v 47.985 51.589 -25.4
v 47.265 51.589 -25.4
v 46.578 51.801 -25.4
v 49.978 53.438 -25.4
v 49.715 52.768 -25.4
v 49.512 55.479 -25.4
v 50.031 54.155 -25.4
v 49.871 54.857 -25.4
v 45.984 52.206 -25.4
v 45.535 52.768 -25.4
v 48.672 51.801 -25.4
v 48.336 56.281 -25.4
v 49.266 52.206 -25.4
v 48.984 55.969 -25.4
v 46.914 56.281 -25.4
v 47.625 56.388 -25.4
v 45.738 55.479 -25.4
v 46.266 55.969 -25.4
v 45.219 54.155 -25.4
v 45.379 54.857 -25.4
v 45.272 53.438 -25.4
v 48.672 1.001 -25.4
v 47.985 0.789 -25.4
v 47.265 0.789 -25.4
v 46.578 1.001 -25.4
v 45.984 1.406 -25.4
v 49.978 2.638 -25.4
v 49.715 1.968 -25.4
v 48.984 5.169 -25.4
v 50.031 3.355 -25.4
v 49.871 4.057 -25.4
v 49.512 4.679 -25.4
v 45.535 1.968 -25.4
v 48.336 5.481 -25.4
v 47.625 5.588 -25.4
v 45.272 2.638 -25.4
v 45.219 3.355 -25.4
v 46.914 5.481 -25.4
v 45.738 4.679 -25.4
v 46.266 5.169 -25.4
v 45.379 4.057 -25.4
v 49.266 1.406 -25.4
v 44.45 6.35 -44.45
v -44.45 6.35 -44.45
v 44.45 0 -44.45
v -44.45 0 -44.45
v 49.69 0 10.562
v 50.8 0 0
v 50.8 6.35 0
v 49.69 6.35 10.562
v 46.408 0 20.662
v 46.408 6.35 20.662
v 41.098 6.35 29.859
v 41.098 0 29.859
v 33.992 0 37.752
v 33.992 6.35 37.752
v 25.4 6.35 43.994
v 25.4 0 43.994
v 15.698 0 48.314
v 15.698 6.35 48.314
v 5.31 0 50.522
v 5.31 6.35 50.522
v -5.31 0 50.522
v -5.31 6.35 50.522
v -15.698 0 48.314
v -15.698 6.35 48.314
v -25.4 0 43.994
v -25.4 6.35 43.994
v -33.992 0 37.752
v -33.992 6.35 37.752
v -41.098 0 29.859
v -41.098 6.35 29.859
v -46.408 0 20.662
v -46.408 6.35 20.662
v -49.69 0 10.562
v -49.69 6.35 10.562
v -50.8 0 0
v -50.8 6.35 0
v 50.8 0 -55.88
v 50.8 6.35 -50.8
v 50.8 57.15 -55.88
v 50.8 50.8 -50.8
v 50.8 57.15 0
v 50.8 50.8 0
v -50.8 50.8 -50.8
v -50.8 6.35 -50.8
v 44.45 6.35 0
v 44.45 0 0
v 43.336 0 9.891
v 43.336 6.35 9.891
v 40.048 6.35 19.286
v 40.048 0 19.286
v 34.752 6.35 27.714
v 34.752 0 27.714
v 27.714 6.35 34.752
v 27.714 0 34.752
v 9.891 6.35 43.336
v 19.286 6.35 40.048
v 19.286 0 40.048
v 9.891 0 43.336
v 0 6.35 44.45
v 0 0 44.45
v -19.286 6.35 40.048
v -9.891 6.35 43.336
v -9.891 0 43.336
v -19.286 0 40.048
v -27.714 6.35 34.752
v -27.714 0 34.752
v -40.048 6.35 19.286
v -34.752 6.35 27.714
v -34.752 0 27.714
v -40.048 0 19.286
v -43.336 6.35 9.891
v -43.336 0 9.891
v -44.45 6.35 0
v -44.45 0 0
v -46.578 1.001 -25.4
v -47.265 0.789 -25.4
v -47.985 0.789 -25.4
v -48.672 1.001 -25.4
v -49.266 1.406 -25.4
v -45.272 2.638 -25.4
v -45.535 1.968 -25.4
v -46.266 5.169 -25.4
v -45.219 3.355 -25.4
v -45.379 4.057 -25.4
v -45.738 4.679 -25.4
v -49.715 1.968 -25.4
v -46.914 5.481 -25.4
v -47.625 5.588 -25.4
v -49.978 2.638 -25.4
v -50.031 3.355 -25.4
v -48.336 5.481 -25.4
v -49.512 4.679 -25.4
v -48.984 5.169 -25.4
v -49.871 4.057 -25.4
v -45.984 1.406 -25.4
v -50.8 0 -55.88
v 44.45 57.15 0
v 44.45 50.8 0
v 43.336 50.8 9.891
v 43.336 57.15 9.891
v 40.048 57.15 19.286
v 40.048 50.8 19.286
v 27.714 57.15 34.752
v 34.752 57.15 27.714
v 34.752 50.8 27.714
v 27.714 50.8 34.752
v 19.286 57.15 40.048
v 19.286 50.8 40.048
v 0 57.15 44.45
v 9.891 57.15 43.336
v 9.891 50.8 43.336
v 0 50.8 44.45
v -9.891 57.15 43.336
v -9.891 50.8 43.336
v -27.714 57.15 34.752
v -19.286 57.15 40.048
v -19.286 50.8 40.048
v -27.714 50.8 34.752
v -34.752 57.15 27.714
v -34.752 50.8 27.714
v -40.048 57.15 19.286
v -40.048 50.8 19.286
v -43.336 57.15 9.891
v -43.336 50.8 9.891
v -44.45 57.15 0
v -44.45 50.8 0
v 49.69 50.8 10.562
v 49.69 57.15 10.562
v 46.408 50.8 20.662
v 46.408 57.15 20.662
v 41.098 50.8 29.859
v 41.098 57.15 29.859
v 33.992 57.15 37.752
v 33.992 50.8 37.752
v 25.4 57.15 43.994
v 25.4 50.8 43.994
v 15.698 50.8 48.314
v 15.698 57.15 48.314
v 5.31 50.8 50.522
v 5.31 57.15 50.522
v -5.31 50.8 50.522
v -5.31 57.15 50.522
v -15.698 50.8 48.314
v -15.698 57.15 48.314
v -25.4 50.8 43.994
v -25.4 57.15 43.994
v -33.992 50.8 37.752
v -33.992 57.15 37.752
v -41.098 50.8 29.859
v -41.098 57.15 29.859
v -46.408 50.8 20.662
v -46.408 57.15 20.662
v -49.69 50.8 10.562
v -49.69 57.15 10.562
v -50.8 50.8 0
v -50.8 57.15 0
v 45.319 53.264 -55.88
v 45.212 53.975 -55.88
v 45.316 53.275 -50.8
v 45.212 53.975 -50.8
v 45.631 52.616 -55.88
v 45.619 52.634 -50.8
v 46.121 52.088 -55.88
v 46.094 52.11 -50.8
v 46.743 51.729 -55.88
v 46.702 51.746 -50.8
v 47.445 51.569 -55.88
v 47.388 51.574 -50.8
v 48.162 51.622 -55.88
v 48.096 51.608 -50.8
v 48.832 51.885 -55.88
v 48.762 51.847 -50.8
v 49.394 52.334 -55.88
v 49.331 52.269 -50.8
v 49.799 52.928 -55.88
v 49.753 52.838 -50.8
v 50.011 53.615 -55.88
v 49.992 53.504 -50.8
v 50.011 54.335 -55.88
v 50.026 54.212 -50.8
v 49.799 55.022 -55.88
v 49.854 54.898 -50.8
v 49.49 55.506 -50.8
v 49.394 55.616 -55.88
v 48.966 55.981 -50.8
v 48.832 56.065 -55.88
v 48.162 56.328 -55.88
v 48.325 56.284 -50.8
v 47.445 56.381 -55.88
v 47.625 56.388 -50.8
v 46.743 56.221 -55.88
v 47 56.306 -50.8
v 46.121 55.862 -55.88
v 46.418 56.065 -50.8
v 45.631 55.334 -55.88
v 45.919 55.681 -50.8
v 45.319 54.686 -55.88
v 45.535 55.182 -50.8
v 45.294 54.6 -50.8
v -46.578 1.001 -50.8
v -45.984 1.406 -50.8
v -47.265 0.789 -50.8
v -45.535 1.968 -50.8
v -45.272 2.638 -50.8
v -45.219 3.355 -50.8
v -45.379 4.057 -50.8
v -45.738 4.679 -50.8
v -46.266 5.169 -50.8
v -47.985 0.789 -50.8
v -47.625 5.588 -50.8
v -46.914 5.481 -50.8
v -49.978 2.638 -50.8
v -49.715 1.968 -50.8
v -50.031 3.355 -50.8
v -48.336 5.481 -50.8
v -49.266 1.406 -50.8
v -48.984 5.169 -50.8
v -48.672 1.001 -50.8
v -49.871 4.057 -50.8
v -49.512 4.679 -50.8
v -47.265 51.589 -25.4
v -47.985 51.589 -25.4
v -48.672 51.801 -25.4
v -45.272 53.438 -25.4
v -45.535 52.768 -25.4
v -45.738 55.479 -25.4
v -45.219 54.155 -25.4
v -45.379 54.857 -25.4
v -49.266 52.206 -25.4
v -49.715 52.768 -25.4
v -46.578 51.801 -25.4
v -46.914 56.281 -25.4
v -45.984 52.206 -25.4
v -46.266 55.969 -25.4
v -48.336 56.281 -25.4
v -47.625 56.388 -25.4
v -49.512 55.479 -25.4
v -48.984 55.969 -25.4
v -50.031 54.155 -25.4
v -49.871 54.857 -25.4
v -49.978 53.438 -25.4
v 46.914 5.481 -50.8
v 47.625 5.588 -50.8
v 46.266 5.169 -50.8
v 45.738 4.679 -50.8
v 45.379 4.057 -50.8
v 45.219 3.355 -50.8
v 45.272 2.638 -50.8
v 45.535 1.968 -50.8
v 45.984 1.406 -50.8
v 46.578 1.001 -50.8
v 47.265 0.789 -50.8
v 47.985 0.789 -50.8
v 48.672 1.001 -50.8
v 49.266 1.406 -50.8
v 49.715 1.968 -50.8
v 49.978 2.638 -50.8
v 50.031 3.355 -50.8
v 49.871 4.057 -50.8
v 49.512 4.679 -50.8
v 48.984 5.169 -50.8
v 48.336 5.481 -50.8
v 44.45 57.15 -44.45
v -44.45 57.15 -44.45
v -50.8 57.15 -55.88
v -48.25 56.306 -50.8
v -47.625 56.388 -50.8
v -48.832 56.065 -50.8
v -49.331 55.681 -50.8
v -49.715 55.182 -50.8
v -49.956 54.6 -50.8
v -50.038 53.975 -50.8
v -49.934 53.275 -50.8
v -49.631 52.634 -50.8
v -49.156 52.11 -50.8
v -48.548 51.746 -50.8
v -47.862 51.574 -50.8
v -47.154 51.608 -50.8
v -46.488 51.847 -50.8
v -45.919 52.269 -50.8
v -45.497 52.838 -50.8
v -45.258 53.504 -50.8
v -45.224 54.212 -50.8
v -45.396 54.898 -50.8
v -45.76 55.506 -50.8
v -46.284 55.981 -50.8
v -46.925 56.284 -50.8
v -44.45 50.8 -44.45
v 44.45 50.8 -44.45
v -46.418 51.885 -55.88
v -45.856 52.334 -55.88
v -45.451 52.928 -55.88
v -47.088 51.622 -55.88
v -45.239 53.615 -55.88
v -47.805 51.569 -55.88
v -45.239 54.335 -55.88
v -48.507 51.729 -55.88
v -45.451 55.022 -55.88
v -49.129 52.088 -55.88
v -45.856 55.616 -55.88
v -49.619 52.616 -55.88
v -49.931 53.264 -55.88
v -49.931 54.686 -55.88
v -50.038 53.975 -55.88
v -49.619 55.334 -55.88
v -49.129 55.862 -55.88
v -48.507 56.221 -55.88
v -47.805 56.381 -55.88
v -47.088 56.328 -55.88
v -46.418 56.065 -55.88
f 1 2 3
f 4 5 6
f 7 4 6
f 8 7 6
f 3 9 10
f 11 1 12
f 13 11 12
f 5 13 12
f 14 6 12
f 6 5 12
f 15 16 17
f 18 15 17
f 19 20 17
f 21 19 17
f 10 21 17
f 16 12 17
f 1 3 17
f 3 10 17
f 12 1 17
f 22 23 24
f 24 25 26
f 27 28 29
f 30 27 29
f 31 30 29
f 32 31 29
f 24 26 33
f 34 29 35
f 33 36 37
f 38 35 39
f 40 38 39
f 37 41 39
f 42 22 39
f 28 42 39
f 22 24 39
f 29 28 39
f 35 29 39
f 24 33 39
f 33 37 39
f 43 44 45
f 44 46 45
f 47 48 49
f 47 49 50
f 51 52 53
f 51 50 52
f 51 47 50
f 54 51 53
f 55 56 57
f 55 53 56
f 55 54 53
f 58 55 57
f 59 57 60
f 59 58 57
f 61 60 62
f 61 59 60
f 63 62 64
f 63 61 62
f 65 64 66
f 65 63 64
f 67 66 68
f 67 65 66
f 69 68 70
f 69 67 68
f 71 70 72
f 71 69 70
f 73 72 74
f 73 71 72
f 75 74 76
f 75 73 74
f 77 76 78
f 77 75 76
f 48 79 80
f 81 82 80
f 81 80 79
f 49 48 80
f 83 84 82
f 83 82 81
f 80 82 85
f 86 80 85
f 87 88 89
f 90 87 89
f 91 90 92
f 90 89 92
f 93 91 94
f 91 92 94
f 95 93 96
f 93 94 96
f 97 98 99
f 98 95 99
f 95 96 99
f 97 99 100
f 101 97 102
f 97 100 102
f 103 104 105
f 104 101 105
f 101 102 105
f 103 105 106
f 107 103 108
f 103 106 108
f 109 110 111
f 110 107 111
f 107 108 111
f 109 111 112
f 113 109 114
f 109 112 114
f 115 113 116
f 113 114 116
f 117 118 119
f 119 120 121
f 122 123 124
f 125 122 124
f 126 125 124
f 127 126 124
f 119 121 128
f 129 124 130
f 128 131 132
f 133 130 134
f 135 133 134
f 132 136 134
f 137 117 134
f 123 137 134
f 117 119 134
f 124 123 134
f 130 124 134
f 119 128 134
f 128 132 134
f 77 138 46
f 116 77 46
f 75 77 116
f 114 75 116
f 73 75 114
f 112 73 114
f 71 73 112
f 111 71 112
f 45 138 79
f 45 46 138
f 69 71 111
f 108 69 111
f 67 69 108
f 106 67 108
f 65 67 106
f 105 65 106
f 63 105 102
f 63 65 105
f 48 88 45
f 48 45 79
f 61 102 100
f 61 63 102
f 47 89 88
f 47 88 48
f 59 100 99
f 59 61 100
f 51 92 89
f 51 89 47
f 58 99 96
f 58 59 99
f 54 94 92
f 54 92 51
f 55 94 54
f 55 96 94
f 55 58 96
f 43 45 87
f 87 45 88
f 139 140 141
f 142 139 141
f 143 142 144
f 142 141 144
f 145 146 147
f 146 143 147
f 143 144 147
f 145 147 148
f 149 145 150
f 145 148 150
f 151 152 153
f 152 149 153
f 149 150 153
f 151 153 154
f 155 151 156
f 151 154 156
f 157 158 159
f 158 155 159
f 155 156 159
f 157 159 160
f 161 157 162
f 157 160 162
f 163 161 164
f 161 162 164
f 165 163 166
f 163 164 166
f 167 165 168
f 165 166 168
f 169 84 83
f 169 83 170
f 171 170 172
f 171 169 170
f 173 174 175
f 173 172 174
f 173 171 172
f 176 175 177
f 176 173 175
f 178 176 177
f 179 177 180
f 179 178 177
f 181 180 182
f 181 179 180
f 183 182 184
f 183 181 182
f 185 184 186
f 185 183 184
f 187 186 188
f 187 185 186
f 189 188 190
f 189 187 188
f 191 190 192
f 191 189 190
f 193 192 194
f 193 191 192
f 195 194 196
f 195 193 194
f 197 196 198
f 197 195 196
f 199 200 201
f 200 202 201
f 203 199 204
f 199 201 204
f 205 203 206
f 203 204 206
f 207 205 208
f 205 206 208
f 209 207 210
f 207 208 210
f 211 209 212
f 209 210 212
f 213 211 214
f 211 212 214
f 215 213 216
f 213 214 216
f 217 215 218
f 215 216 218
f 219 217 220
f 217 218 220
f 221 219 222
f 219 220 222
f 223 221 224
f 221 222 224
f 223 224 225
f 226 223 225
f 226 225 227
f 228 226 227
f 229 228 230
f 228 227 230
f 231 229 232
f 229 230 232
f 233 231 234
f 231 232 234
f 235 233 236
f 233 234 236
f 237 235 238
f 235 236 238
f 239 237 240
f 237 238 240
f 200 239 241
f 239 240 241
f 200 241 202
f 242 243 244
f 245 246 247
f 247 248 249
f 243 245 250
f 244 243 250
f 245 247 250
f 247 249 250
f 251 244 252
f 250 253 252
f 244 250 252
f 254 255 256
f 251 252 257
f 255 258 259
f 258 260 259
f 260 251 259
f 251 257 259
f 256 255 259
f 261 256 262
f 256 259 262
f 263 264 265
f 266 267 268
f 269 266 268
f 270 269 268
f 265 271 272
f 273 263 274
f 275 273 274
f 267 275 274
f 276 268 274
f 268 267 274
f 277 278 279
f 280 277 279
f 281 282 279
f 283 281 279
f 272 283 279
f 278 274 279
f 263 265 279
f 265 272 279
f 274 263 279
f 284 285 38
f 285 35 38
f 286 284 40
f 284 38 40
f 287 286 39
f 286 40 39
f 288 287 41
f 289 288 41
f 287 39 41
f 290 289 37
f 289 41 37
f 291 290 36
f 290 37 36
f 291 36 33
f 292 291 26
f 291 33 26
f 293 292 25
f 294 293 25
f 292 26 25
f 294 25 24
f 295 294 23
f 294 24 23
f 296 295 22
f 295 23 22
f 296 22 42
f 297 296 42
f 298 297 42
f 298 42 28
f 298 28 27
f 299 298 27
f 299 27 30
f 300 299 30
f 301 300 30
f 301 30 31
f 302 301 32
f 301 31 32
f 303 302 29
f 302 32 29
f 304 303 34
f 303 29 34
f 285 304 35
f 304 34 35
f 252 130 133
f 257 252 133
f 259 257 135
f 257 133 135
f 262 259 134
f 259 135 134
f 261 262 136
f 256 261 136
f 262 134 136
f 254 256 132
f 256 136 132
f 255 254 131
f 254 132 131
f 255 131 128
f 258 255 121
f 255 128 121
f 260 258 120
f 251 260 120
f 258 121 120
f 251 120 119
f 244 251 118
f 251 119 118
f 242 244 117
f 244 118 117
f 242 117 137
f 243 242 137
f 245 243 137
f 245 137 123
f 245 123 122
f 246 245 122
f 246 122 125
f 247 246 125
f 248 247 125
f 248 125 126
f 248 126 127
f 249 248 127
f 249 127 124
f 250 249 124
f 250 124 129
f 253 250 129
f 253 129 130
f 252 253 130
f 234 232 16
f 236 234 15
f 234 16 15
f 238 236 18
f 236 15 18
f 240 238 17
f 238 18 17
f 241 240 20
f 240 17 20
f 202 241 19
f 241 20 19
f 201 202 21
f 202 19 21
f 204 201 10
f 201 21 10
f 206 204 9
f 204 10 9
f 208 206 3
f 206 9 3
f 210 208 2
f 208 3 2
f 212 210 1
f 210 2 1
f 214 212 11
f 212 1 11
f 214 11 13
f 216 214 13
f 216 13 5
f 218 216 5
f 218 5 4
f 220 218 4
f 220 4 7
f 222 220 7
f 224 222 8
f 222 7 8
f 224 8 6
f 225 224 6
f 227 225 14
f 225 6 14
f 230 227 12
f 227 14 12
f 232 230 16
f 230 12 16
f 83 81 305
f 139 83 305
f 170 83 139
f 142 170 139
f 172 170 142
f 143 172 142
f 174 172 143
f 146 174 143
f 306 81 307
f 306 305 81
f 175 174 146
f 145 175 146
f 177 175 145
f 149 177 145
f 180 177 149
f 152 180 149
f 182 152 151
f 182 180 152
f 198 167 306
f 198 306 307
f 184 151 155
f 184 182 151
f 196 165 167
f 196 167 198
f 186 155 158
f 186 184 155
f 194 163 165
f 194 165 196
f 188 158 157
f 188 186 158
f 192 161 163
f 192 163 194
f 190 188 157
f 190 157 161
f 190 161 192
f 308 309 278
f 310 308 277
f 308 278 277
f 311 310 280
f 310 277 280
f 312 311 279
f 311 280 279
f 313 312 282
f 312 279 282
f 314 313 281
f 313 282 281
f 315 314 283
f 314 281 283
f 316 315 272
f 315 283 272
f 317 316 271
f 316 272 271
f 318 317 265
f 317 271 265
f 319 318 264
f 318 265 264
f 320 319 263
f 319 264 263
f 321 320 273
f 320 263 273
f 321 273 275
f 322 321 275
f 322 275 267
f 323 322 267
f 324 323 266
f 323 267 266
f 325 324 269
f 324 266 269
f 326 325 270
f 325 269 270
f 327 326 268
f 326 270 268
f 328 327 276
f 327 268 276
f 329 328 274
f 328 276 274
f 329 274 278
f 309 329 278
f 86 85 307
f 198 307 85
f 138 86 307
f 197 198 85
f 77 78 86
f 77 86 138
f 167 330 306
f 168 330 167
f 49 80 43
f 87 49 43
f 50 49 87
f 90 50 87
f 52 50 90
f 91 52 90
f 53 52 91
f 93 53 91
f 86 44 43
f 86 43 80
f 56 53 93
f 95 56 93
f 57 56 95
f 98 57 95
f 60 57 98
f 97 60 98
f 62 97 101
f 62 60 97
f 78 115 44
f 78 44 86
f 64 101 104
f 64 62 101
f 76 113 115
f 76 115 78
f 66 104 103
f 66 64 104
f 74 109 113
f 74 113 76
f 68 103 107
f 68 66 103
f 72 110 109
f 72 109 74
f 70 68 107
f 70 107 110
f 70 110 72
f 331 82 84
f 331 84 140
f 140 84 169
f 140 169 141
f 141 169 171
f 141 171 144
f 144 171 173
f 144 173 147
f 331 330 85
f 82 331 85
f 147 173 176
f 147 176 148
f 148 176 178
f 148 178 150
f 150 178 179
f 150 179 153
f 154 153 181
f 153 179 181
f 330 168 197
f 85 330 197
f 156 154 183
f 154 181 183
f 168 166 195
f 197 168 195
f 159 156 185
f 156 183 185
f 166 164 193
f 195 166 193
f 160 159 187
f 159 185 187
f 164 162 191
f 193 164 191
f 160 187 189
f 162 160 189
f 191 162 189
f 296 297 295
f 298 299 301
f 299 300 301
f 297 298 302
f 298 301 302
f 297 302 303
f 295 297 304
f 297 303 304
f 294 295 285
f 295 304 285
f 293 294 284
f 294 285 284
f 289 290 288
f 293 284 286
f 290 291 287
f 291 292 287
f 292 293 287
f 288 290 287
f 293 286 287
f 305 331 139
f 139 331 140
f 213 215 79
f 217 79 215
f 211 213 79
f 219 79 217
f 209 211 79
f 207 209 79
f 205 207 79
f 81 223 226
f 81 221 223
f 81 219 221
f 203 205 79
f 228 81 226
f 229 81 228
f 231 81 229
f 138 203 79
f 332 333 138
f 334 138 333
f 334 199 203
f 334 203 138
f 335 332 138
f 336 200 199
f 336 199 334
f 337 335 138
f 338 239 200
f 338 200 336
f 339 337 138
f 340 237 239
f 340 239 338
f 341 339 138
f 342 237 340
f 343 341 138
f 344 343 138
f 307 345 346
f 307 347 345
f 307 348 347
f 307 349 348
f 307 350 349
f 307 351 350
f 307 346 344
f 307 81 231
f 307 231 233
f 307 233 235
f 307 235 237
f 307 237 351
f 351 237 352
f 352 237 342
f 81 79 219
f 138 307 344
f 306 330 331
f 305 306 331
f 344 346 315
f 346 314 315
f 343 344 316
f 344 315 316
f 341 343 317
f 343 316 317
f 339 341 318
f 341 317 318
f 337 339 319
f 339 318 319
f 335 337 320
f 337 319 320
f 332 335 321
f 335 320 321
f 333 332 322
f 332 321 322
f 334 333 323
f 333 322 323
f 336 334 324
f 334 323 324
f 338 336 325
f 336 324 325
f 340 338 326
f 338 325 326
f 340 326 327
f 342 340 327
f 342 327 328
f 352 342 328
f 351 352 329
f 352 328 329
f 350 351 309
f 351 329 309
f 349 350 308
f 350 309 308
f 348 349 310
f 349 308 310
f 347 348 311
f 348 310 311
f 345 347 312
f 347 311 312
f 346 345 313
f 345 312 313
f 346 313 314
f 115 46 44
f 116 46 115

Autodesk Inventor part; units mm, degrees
ref_plane "YZ Plane" through (0, 0, 0) normal (1, 0, 0) x (0, 1, 0)
ref_plane "XZ Plane" through (0, 0, 0) normal (0, 1, 0) x (-1, 0, 0)
ref_plane "XY Plane" through (0, 0, 0) normal (0, 0, 1) x (1, 0, 0)
sketch "Sketch1" plane through (0, 0, 0) normal (0, 1, 0) x (-1, 0, 0)
  line L0 (50.8, -50.8) -> (-50.8, -50.8)
  line L1 (50.8, -50.8) -> (50.8, 0)
  line L2 (-50.8, -50.8) -> (-50.8, 0)
  arc A0 (50.8, 0) -> (-50.8, 0) centre (0, 0) ccw
  line L3 (44.45, -44.45) -> (-44.45, -44.45)
  line L4 (-44.45, -44.45) -> (-44.45, 0)
  line L5 (44.45, -44.45) -> (44.45, 0)
  arc A1 (44.45, 0) -> (-44.45, 0) centre (0, 0) ccw
  dimension "d2" = 101.6
  dimension "d4" = 6.35
  dimension "d5" = 6.35
  dimension "d6" = 6.35
  dimension "d34" = 44.45
  dimension "d36" = 44.45
extrude "Extrusion1" add sketch "Sketch1" along normal blind 6.35
sketch "Sketch2" plane through (50.8, 0, -50.8) normal (0, 0, -1) x (-1, 0, 0)
  line L0 (101.6, 0) -> (101.6, 6.35) projected
  line L1 (0, 6.35) -> (101.6, 6.35) projected
  line L2 (0, 0) -> (0, 6.35) projected
  point P0 (50.8, 0)
  point P1 (3.175, 3.175)
  point P2 (98.425, 3.175)
  dimension "d9" = 3.175
  dimension "d10" = 3.175
  dimension "d11" = 3.175
hole "Hole1" at (47.625, 3.175, -50.8) at (-47.625, 3.175, -50.8) direction (0, 0, 1) diameter 4.826 depth 25.4
pattern_linear "Rectangular Pattern1" count 2 spacing 50.8 along (0, 1, 0) of "Extrusion1"
sketch "Sketch3" plane through (50.8, 50.8, -50.8) normal (0, 0, -1) x (-1, 0, 0)
  line L0 (101.6, 0) -> (101.6, 6.35) projected
  line L1 (0, 6.35) -> (101.6, 6.35) projected
  line L2 (0, 0) -> (0, 6.35) projected
  point P0 (50.8, -50.8)
  point P1 (3.175, 3.175)
  point P2 (98.425, 3.175)
  dimension "d22" = 3.175
  dimension "d23" = 3.175
  dimension "d24" = 3.175
hole "Hole2" at (47.625, 53.975, -50.8) at (-47.625, 53.975, -50.8) direction (0, 0, 1) diameter 4.826 depth 25.4
sketch "Sketch4" plane through (50.8, 50.8, -50.8) normal (0, 0, -1) x (-1, 0, 0)
  circle A0 centre (3.175, 3.175) radius 2.413 projected
  circle A1 centre (98.425, 3.175) radius 2.413 projected
  line L0 (101.6, 0) -> (0, 0) construction
  line L1 (0, 6.35) -> (101.6, 6.35) projected
  line L2 (0, 6.35) -> (101.6, 6.35)
  line L3 (0, 6.35) -> (101.6, 6.35)
  line L4 (101.6, 6.35) -> (101.6, -50.8)
  line L5 (101.6, -50.8) -> (0, -50.8)
  line L6 (0, -50.8) -> (0, 6.35)
  point P0 (50.8, -50.8)
extrude "Extrusion3" add sketch "Sketch4" along normal blind 5.08
equation "\"d5\" = d4"
equation "\"d6\" = d4"
equation "\"d10\" = d9"
equation "\"d23\" = d22"
properties part number "router_mount"
